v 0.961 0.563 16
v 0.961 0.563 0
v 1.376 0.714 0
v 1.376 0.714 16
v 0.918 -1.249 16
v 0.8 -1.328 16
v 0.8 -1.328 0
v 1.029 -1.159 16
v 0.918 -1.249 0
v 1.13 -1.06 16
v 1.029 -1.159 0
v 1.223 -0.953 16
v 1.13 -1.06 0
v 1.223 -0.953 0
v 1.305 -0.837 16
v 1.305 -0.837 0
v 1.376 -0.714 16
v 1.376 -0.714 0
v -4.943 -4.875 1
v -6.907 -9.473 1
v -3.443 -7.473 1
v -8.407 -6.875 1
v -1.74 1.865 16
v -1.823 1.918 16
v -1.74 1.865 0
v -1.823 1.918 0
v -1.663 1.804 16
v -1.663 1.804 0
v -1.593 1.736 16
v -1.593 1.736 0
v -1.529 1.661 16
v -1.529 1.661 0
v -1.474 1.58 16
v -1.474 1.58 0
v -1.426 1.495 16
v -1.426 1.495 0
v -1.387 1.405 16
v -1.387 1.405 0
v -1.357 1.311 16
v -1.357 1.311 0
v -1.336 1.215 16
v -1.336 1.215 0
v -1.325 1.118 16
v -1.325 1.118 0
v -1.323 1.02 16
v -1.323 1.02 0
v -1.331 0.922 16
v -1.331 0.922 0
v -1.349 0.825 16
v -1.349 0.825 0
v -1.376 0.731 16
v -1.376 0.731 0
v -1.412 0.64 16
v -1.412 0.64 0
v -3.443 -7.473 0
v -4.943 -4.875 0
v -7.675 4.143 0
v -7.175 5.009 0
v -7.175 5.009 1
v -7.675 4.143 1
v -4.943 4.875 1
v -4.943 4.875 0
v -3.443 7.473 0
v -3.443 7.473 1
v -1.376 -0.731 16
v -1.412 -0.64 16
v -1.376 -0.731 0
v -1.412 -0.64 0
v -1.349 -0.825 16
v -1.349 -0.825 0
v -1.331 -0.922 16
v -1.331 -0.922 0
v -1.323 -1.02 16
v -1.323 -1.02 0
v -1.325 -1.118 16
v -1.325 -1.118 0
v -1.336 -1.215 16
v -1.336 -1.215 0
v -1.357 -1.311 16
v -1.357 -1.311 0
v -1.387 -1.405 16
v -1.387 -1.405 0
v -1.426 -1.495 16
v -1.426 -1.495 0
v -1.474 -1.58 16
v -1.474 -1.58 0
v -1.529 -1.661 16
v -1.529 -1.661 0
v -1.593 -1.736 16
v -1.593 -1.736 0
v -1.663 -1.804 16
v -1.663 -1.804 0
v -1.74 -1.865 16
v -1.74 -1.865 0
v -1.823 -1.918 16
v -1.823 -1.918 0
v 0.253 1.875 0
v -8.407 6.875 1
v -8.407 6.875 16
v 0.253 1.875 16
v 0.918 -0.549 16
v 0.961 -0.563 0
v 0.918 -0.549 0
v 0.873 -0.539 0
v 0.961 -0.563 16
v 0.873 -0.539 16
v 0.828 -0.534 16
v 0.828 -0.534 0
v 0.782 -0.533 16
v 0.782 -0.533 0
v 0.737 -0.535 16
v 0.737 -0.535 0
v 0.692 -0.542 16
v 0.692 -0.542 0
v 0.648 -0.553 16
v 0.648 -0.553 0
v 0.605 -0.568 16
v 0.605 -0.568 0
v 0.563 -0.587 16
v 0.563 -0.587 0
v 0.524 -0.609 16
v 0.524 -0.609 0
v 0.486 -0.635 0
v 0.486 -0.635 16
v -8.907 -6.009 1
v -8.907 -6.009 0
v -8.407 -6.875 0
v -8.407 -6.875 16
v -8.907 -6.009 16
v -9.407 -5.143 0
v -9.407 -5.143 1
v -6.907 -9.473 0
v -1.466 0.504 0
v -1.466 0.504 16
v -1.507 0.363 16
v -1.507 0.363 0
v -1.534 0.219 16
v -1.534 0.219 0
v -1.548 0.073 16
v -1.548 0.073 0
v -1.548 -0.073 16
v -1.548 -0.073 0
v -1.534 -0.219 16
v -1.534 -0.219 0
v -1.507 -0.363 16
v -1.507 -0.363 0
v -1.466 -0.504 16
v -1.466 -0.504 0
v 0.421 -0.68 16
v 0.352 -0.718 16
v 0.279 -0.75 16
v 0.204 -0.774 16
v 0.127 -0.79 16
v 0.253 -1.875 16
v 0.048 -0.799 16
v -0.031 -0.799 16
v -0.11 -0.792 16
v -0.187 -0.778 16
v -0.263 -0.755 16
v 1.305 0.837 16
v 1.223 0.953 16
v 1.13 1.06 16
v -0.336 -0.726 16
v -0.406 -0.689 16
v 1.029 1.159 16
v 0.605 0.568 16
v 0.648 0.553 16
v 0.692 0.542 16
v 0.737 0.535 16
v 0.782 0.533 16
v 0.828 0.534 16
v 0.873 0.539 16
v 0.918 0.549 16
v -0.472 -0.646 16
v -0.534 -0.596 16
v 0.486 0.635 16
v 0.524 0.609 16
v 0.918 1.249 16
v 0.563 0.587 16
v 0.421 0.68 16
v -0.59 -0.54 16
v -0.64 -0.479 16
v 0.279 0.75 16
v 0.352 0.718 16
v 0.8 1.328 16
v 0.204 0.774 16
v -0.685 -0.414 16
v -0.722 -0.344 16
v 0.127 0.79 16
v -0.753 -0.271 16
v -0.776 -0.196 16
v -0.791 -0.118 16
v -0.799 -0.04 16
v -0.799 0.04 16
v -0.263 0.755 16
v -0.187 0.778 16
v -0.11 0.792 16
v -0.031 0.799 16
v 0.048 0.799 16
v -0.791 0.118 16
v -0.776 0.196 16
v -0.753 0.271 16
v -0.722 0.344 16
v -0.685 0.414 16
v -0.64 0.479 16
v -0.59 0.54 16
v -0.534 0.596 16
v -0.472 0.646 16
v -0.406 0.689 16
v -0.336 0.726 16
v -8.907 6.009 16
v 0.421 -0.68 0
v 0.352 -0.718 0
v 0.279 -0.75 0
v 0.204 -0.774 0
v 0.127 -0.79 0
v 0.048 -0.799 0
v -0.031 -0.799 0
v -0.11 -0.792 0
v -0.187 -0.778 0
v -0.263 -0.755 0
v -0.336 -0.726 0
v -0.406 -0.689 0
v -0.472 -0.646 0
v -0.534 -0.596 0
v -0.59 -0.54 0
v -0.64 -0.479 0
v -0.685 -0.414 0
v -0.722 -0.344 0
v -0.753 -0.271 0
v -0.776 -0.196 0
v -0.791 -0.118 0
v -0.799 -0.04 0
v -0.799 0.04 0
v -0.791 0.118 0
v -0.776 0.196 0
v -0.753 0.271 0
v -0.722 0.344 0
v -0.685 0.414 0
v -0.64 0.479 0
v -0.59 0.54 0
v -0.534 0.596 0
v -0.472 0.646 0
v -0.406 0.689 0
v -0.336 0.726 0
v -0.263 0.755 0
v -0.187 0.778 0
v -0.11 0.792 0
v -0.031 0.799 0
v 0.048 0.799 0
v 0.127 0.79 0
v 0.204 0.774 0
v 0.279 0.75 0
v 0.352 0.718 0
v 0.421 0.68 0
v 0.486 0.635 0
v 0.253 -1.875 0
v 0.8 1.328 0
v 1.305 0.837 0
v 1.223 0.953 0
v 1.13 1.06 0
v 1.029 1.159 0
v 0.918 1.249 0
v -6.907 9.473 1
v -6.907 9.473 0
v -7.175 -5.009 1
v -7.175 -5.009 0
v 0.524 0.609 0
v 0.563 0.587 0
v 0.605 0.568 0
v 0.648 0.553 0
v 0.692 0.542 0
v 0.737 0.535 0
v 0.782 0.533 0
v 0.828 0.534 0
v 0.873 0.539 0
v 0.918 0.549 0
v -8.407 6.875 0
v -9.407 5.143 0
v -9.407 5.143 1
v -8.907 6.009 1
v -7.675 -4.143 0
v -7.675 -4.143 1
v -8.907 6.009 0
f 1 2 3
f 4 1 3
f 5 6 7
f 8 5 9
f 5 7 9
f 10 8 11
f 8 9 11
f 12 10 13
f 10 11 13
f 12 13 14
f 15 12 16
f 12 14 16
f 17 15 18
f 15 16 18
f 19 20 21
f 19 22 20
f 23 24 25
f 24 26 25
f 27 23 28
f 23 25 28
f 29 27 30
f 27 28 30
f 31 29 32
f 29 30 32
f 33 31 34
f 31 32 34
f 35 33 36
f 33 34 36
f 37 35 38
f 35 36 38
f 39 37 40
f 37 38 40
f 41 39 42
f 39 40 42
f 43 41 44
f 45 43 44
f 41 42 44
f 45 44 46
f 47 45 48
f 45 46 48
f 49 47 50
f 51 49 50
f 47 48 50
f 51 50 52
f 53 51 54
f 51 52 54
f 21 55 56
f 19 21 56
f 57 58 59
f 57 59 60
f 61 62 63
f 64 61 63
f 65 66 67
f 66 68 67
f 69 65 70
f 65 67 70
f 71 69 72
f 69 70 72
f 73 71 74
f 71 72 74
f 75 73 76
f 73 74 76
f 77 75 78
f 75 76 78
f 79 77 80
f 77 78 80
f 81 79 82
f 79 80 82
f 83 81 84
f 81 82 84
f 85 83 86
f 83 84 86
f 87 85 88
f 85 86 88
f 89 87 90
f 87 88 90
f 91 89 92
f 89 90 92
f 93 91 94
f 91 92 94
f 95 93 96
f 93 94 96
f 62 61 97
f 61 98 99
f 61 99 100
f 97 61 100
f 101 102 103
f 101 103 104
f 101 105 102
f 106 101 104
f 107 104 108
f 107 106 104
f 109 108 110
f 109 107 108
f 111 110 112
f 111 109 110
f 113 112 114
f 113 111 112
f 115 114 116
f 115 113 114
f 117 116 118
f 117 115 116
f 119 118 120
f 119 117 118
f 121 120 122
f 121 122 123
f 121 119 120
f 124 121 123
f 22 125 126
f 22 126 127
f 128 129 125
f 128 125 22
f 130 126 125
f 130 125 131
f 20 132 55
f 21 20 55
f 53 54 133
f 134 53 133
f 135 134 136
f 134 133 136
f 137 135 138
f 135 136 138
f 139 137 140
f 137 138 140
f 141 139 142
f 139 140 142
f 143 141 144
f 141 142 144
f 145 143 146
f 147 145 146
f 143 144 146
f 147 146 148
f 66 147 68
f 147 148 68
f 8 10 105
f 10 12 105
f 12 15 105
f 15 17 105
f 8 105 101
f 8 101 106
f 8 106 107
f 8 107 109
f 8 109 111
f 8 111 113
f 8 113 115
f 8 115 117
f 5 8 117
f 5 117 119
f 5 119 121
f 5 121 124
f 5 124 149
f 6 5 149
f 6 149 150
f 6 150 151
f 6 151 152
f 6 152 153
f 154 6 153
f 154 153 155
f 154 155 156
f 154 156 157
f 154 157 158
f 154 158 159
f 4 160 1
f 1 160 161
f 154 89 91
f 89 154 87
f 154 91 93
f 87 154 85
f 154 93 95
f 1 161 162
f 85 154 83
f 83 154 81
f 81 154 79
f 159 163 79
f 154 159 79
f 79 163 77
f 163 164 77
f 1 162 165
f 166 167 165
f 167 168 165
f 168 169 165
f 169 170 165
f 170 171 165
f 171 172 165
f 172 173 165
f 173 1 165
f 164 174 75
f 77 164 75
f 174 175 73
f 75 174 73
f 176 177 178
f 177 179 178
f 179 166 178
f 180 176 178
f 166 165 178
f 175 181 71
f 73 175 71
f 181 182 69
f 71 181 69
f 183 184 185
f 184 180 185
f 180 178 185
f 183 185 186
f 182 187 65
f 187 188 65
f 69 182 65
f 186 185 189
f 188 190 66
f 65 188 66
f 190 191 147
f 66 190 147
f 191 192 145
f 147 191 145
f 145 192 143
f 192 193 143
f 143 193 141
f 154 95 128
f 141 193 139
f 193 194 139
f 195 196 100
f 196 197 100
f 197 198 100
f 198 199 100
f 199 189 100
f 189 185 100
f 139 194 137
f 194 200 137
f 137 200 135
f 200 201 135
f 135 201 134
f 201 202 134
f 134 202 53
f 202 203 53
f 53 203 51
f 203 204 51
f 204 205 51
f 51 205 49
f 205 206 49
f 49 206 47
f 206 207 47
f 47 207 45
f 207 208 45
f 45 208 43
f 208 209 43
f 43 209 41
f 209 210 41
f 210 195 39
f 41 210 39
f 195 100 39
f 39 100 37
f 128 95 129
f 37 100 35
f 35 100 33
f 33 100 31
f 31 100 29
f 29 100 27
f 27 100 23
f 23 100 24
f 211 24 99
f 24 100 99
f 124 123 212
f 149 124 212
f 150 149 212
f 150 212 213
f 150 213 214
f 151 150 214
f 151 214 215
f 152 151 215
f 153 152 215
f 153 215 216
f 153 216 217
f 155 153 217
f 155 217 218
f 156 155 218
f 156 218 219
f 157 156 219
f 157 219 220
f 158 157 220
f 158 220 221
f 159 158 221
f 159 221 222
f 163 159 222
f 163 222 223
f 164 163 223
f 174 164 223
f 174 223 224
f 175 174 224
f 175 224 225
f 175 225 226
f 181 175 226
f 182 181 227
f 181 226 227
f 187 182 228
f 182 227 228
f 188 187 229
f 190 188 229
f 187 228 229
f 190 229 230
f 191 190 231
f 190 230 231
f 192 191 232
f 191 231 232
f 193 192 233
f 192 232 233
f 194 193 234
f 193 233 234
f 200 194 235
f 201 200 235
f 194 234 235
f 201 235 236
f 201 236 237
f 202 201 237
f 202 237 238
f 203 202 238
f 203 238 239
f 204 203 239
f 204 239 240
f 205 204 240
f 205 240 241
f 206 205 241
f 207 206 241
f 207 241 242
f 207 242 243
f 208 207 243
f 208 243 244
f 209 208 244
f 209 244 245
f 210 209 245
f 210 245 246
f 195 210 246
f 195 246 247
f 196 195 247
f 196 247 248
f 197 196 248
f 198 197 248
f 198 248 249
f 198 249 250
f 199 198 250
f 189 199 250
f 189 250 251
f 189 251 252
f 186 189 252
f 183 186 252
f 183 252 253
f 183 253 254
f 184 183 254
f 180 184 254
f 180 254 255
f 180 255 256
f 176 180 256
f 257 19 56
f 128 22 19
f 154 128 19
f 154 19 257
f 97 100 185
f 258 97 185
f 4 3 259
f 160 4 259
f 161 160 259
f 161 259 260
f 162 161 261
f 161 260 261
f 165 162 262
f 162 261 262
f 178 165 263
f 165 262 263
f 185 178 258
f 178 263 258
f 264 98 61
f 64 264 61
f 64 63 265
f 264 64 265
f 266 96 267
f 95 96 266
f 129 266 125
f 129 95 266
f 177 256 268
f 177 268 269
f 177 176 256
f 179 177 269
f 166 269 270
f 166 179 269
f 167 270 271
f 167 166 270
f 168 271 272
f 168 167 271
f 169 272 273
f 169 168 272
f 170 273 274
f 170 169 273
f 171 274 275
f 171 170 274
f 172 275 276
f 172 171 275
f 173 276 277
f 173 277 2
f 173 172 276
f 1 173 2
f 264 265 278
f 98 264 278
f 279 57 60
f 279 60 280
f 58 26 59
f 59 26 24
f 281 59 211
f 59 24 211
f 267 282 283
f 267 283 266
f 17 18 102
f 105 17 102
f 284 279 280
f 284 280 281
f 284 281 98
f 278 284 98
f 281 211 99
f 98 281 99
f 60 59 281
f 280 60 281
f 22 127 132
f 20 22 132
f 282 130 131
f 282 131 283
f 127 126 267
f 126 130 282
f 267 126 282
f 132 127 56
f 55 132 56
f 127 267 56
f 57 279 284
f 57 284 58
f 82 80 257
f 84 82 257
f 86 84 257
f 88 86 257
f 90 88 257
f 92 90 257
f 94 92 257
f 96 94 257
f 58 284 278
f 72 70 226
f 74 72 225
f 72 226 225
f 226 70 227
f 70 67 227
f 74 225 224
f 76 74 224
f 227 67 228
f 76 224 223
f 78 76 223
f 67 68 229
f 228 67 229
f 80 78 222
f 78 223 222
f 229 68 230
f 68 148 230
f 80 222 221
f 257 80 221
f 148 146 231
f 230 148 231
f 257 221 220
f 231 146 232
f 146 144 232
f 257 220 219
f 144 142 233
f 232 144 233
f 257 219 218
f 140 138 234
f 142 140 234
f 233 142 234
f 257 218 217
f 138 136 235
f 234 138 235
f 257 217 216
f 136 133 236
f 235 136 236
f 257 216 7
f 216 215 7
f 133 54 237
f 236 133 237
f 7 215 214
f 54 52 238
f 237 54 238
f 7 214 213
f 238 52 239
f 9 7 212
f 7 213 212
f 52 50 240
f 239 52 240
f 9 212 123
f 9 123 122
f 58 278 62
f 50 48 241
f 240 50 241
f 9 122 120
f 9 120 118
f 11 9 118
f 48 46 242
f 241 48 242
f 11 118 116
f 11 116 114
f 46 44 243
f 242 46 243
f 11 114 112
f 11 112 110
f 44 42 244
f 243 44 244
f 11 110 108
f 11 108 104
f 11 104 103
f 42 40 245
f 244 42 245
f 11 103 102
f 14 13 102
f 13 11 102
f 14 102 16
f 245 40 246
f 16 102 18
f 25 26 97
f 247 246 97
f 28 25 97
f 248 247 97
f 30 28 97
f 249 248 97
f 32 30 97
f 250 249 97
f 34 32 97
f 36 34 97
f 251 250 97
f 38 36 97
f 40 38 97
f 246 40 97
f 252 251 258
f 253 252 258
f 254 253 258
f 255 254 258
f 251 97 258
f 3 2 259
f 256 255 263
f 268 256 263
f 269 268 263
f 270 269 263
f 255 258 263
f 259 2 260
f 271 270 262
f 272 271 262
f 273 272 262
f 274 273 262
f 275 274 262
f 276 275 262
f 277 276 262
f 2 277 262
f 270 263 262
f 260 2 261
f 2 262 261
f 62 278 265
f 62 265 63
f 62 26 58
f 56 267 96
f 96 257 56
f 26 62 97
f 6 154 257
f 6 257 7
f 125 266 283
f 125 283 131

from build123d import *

# Parameters (mm, degrees)
BOSS_EXTRUDE2_DEPTH = 16
BOSS_EXTRUDE3_DEPTH = 16
FILLET9_R           = 0.5
BOSS_EXTRUDE4_DEPTH = 1
FILLET10_R          = 1


with BuildPart() as part:
    # Sketch5 → Boss-Extrude2 (new body)
    with BuildSketch(Plane(origin=(4.228476288, 0, 0), x_dir=(1, 0, 0), z_dir=(0, 0, 1))):
        with BuildLine():
            Line((-3.568997542, 0.452866188), (-2.852532713, 0.71363806))
            ThreePointArc((-2.852532713, 0.71363806), (-5.778476288, 0), (-2.852532713, -0.71363806))
            Line((-2.852532713, -0.71363806), (-3.568997542, -0.452866188))
            ThreePointArc((-3.568997542, -0.452866188), (-5.028476288, 0), (-3.568997542, 0.452866188))
        make_face()
    extrude(amount=BOSS_EXTRUDE2_DEPTH)

    # Sketch6 → Boss-Extrude3 (add)
    with BuildSketch(Plane.XY.offset(16)):
        Polygon((-8.907406692, 6.008719055), (-8.407406692, 6.874744459), (0.252847346, 1.874744459), (1.327591805, 0.8), (0.114359354, 0.8), align=None)
        Polygon((0.252847346, -1.874744459), (1.327591805, -0.8), (0.114359354, -0.8), (-8.907406692, -6.008719055), (-8.407406692, -6.874744459), align=None)
    extrude(amount=-BOSS_EXTRUDE3_DEPTH)

    # Fillet9
    fillet9_edges = [part.edges().sort_by_distance(p)[0] for p in [
        (0.659478746, -0.452866188, 8),
        (0.659478746, 0.452866188, 8),
    ]]
    fillet(fillet9_edges, radius=FILLET9_R)

    # Sketch7 → Boss-Extrude4 (add)
    with BuildSketch(Plane(origin=(0, 0, 0), x_dir=(-1, 0, 0), z_dir=(0, 0, -1))):
        Polygon((8.407406692, 6.874744459), (4.943305077, 4.874744459), (3.443305077, 7.47282067), (6.907406692, 9.47282067), align=None)
        Polygon((6.907406692, -9.47282067), (3.443305077, -7.47282067), (4.943305077, -4.874744459), (8.407406692, -6.874744459), align=None)
        Polygon((8.907406692, 6.008719055), (7.175355885, 5.008719055), (7.675355885, 4.142693652), (9.407406692, 5.142693652), align=None)
        Polygon((9.407406692, -5.142693652), (7.675355885, -4.142693652), (7.175355885, -5.008719055), (8.907406692, -6.008719055), align=None)
    extrude(amount=-BOSS_EXTRUDE4_DEPTH)

    # Fillet10
    fillet10_edges = [part.edges().sort_by_distance(p)[0] for p in [
        (-0.799734012, 1.327752051, 8),
        (-0.799734012, -1.327752051, 8),
    ]]
    fillet(fillet10_edges, radius=FILLET10_R)


solid = part.part
